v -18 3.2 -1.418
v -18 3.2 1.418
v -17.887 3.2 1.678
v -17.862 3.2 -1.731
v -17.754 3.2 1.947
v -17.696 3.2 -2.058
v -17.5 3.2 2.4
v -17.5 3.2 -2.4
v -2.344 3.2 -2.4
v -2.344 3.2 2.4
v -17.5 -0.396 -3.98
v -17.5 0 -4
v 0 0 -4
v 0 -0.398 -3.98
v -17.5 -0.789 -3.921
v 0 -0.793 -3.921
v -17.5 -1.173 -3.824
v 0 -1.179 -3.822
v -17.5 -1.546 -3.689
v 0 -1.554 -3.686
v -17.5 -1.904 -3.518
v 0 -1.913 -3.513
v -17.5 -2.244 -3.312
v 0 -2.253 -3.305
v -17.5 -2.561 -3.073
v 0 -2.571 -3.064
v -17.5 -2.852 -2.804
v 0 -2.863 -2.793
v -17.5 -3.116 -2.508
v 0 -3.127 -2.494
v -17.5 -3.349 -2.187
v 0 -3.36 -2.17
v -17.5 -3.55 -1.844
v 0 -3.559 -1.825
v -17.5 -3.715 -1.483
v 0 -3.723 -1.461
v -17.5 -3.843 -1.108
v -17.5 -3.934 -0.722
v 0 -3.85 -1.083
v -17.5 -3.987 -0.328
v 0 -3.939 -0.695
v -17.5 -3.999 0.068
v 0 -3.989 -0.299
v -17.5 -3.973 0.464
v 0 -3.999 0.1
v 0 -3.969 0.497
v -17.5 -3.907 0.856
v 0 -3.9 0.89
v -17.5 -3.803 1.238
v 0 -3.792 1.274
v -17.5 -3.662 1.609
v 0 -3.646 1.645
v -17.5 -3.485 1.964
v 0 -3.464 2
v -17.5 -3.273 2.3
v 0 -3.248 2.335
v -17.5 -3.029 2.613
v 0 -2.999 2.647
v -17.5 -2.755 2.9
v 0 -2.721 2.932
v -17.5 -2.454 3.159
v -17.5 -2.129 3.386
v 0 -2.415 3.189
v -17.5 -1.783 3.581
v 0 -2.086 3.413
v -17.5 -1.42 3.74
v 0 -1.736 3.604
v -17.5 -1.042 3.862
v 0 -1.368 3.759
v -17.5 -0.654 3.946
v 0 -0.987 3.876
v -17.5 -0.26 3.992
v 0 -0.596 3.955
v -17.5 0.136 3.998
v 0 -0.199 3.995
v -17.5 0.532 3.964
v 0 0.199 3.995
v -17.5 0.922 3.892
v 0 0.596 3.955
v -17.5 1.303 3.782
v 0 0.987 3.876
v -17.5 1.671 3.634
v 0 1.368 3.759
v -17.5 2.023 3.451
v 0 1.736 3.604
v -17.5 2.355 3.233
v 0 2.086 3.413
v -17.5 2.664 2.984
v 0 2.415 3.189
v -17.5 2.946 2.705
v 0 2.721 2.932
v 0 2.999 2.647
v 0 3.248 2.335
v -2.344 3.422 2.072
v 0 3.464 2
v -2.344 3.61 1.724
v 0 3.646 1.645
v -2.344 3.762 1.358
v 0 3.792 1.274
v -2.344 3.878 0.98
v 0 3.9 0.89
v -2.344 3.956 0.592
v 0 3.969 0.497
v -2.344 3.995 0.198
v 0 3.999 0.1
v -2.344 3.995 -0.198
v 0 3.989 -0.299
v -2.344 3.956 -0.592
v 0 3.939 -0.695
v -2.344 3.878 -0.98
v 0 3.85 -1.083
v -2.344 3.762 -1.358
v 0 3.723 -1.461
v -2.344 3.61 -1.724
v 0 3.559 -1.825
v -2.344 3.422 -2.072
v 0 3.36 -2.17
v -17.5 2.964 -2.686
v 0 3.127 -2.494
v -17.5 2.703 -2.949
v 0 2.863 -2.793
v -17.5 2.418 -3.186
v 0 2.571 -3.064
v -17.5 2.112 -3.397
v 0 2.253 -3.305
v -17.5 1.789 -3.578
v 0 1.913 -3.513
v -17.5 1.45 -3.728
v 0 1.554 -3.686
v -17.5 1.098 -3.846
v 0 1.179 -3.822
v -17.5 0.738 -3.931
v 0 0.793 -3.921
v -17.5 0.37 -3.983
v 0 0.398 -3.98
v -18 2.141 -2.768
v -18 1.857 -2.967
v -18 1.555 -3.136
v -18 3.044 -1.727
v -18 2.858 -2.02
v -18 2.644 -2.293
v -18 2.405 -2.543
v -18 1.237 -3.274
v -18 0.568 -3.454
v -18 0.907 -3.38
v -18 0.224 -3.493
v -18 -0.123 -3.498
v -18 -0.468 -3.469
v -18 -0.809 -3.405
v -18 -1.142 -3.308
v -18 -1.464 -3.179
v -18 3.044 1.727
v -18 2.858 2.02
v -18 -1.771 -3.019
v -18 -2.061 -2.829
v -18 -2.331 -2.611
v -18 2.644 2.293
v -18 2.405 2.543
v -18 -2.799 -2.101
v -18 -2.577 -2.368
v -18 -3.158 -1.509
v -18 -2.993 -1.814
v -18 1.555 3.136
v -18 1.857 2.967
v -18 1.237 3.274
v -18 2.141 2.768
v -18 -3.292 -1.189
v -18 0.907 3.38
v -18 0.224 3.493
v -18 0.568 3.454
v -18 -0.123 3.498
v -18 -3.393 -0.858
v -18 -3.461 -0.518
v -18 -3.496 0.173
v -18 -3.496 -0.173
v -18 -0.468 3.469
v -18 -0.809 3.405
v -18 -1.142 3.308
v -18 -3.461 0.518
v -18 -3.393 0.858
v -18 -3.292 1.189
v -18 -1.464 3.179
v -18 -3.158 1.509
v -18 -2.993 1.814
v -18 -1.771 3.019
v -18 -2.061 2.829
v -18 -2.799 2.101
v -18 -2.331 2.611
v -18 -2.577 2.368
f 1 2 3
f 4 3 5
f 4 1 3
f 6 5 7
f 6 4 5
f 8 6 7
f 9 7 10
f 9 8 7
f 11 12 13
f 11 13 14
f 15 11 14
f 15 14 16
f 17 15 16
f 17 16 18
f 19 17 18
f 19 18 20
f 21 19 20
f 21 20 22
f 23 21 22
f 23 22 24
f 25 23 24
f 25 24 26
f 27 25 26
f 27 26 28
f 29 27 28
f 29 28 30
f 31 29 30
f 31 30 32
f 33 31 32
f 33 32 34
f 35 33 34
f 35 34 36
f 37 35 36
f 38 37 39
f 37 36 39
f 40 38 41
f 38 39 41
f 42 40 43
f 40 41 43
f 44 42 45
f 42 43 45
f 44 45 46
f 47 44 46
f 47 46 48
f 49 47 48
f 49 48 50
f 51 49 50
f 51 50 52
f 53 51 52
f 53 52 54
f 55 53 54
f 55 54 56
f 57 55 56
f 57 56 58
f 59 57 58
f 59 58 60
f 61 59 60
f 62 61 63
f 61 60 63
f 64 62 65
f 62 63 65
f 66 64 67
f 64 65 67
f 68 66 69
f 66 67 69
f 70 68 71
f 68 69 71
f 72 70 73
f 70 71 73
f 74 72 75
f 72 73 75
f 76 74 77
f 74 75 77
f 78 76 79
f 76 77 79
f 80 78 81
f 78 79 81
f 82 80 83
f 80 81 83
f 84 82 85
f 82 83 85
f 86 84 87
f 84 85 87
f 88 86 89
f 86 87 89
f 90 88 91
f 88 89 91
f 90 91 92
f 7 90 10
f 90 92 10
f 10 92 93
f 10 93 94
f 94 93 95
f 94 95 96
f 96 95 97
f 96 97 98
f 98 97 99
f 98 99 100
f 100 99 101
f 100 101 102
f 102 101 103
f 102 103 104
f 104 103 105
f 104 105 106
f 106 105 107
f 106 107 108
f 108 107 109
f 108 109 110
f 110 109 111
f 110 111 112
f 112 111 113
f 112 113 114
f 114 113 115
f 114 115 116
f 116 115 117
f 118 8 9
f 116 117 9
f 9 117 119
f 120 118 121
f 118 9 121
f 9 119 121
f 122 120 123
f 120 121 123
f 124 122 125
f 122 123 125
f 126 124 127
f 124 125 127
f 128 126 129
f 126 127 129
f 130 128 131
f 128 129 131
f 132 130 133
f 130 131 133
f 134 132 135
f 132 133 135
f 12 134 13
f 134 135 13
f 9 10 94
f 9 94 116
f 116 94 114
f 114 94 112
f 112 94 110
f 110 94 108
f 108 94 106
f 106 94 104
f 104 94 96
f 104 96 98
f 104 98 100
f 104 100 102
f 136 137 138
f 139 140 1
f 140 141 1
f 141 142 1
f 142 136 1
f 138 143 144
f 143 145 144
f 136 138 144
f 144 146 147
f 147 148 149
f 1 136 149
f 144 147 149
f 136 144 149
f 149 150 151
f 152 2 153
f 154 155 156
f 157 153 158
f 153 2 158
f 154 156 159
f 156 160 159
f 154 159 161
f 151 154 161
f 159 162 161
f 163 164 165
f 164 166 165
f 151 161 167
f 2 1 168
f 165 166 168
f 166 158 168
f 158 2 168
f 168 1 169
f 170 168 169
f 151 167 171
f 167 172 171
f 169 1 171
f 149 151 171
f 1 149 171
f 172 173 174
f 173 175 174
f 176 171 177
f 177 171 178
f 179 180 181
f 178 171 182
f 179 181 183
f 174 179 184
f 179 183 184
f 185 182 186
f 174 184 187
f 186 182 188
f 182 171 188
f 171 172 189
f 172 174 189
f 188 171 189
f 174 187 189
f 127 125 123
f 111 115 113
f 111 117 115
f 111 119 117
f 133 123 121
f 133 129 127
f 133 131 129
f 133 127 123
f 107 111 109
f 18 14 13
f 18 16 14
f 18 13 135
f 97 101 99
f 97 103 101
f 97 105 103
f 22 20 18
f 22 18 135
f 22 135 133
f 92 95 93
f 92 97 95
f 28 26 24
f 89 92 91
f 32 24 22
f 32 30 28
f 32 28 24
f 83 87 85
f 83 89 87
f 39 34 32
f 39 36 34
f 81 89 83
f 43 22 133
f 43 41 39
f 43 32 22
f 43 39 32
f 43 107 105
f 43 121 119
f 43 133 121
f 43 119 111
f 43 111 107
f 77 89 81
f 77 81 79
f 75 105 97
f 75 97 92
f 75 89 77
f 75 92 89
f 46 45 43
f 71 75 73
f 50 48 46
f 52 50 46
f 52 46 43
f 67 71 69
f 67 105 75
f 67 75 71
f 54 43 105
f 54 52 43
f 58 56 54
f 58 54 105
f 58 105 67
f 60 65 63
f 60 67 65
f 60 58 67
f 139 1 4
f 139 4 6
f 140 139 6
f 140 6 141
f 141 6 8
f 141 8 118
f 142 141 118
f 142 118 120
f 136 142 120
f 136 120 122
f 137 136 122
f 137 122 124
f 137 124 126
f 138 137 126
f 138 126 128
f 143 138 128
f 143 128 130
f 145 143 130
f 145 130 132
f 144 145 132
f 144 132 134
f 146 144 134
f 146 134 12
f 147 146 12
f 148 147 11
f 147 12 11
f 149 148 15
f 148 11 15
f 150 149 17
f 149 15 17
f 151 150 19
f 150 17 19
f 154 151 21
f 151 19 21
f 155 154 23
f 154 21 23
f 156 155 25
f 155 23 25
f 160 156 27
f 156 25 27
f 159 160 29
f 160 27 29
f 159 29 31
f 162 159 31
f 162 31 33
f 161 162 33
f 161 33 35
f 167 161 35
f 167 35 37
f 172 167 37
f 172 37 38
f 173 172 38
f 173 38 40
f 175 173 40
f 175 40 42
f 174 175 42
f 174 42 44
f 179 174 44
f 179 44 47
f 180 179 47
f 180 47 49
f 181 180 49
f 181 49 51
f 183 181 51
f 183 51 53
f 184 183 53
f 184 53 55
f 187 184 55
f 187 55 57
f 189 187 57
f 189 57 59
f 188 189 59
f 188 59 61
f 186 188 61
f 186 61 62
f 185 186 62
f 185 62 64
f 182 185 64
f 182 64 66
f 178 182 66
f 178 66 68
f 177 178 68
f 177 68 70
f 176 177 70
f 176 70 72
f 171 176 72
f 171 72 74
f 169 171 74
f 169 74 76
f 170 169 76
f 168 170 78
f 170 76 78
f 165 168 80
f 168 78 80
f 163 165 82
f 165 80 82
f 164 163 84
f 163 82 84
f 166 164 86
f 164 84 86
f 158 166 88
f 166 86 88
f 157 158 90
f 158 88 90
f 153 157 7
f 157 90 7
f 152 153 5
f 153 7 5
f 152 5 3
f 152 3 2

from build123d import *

# Parameters (mm, degrees)
ESQUISSE1_W                  = 18
ESQUISSE1_H                  = 4
CHANFREIN1_SIZE              = 0.5
ENL_V_MAT_EXTRU_1_DEPTH      = 19.867962264
ENL_V_MAT_EXTRU_1_DEPTH_BACK = 19.867962264
ESQUISSE2_W                  = 17.317421693
ESQUISSE2_H                  = 9.702668892


with BuildPart() as part:
    # Esquisse1 → Base-Révolution (revolve)
    with BuildSketch(Plane.XY, mode=Mode.PRIVATE) as base_r_volution_sk:
        with Locations((-9, 2)):
            Rectangle(ESQUISSE1_W, ESQUISSE1_H)
    revolve(base_r_volution_sk.sketch.rotate(Axis((0, 0, 0), (-1, 0, 0)), 90), axis=Axis((0, 0, 0), (-1, 0, 0)))

    # Chanfrein1
    chanfrein1_edges = [part.edges().sort_by_distance(p)[0] for p in [
        (-18, 0, 4),
    ]]
    chamfer(chanfrein1_edges, length=CHANFREIN1_SIZE)

    # Esquisse2 → Enlèv. mat.-Extru.1 (cut, two sides: drawn at the far end of the back side and taken through both)
    with BuildSketch(Plane.XY.offset(-ENL_V_MAT_EXTRU_1_DEPTH_BACK)):
        with Locations((-11.002531853, 8.051334446)):
            Rectangle(ESQUISSE2_W, ESQUISSE2_H)
    extrude(amount=ENL_V_MAT_EXTRU_1_DEPTH + ENL_V_MAT_EXTRU_1_DEPTH_BACK, mode=Mode.SUBTRACT)


solid = part.part
